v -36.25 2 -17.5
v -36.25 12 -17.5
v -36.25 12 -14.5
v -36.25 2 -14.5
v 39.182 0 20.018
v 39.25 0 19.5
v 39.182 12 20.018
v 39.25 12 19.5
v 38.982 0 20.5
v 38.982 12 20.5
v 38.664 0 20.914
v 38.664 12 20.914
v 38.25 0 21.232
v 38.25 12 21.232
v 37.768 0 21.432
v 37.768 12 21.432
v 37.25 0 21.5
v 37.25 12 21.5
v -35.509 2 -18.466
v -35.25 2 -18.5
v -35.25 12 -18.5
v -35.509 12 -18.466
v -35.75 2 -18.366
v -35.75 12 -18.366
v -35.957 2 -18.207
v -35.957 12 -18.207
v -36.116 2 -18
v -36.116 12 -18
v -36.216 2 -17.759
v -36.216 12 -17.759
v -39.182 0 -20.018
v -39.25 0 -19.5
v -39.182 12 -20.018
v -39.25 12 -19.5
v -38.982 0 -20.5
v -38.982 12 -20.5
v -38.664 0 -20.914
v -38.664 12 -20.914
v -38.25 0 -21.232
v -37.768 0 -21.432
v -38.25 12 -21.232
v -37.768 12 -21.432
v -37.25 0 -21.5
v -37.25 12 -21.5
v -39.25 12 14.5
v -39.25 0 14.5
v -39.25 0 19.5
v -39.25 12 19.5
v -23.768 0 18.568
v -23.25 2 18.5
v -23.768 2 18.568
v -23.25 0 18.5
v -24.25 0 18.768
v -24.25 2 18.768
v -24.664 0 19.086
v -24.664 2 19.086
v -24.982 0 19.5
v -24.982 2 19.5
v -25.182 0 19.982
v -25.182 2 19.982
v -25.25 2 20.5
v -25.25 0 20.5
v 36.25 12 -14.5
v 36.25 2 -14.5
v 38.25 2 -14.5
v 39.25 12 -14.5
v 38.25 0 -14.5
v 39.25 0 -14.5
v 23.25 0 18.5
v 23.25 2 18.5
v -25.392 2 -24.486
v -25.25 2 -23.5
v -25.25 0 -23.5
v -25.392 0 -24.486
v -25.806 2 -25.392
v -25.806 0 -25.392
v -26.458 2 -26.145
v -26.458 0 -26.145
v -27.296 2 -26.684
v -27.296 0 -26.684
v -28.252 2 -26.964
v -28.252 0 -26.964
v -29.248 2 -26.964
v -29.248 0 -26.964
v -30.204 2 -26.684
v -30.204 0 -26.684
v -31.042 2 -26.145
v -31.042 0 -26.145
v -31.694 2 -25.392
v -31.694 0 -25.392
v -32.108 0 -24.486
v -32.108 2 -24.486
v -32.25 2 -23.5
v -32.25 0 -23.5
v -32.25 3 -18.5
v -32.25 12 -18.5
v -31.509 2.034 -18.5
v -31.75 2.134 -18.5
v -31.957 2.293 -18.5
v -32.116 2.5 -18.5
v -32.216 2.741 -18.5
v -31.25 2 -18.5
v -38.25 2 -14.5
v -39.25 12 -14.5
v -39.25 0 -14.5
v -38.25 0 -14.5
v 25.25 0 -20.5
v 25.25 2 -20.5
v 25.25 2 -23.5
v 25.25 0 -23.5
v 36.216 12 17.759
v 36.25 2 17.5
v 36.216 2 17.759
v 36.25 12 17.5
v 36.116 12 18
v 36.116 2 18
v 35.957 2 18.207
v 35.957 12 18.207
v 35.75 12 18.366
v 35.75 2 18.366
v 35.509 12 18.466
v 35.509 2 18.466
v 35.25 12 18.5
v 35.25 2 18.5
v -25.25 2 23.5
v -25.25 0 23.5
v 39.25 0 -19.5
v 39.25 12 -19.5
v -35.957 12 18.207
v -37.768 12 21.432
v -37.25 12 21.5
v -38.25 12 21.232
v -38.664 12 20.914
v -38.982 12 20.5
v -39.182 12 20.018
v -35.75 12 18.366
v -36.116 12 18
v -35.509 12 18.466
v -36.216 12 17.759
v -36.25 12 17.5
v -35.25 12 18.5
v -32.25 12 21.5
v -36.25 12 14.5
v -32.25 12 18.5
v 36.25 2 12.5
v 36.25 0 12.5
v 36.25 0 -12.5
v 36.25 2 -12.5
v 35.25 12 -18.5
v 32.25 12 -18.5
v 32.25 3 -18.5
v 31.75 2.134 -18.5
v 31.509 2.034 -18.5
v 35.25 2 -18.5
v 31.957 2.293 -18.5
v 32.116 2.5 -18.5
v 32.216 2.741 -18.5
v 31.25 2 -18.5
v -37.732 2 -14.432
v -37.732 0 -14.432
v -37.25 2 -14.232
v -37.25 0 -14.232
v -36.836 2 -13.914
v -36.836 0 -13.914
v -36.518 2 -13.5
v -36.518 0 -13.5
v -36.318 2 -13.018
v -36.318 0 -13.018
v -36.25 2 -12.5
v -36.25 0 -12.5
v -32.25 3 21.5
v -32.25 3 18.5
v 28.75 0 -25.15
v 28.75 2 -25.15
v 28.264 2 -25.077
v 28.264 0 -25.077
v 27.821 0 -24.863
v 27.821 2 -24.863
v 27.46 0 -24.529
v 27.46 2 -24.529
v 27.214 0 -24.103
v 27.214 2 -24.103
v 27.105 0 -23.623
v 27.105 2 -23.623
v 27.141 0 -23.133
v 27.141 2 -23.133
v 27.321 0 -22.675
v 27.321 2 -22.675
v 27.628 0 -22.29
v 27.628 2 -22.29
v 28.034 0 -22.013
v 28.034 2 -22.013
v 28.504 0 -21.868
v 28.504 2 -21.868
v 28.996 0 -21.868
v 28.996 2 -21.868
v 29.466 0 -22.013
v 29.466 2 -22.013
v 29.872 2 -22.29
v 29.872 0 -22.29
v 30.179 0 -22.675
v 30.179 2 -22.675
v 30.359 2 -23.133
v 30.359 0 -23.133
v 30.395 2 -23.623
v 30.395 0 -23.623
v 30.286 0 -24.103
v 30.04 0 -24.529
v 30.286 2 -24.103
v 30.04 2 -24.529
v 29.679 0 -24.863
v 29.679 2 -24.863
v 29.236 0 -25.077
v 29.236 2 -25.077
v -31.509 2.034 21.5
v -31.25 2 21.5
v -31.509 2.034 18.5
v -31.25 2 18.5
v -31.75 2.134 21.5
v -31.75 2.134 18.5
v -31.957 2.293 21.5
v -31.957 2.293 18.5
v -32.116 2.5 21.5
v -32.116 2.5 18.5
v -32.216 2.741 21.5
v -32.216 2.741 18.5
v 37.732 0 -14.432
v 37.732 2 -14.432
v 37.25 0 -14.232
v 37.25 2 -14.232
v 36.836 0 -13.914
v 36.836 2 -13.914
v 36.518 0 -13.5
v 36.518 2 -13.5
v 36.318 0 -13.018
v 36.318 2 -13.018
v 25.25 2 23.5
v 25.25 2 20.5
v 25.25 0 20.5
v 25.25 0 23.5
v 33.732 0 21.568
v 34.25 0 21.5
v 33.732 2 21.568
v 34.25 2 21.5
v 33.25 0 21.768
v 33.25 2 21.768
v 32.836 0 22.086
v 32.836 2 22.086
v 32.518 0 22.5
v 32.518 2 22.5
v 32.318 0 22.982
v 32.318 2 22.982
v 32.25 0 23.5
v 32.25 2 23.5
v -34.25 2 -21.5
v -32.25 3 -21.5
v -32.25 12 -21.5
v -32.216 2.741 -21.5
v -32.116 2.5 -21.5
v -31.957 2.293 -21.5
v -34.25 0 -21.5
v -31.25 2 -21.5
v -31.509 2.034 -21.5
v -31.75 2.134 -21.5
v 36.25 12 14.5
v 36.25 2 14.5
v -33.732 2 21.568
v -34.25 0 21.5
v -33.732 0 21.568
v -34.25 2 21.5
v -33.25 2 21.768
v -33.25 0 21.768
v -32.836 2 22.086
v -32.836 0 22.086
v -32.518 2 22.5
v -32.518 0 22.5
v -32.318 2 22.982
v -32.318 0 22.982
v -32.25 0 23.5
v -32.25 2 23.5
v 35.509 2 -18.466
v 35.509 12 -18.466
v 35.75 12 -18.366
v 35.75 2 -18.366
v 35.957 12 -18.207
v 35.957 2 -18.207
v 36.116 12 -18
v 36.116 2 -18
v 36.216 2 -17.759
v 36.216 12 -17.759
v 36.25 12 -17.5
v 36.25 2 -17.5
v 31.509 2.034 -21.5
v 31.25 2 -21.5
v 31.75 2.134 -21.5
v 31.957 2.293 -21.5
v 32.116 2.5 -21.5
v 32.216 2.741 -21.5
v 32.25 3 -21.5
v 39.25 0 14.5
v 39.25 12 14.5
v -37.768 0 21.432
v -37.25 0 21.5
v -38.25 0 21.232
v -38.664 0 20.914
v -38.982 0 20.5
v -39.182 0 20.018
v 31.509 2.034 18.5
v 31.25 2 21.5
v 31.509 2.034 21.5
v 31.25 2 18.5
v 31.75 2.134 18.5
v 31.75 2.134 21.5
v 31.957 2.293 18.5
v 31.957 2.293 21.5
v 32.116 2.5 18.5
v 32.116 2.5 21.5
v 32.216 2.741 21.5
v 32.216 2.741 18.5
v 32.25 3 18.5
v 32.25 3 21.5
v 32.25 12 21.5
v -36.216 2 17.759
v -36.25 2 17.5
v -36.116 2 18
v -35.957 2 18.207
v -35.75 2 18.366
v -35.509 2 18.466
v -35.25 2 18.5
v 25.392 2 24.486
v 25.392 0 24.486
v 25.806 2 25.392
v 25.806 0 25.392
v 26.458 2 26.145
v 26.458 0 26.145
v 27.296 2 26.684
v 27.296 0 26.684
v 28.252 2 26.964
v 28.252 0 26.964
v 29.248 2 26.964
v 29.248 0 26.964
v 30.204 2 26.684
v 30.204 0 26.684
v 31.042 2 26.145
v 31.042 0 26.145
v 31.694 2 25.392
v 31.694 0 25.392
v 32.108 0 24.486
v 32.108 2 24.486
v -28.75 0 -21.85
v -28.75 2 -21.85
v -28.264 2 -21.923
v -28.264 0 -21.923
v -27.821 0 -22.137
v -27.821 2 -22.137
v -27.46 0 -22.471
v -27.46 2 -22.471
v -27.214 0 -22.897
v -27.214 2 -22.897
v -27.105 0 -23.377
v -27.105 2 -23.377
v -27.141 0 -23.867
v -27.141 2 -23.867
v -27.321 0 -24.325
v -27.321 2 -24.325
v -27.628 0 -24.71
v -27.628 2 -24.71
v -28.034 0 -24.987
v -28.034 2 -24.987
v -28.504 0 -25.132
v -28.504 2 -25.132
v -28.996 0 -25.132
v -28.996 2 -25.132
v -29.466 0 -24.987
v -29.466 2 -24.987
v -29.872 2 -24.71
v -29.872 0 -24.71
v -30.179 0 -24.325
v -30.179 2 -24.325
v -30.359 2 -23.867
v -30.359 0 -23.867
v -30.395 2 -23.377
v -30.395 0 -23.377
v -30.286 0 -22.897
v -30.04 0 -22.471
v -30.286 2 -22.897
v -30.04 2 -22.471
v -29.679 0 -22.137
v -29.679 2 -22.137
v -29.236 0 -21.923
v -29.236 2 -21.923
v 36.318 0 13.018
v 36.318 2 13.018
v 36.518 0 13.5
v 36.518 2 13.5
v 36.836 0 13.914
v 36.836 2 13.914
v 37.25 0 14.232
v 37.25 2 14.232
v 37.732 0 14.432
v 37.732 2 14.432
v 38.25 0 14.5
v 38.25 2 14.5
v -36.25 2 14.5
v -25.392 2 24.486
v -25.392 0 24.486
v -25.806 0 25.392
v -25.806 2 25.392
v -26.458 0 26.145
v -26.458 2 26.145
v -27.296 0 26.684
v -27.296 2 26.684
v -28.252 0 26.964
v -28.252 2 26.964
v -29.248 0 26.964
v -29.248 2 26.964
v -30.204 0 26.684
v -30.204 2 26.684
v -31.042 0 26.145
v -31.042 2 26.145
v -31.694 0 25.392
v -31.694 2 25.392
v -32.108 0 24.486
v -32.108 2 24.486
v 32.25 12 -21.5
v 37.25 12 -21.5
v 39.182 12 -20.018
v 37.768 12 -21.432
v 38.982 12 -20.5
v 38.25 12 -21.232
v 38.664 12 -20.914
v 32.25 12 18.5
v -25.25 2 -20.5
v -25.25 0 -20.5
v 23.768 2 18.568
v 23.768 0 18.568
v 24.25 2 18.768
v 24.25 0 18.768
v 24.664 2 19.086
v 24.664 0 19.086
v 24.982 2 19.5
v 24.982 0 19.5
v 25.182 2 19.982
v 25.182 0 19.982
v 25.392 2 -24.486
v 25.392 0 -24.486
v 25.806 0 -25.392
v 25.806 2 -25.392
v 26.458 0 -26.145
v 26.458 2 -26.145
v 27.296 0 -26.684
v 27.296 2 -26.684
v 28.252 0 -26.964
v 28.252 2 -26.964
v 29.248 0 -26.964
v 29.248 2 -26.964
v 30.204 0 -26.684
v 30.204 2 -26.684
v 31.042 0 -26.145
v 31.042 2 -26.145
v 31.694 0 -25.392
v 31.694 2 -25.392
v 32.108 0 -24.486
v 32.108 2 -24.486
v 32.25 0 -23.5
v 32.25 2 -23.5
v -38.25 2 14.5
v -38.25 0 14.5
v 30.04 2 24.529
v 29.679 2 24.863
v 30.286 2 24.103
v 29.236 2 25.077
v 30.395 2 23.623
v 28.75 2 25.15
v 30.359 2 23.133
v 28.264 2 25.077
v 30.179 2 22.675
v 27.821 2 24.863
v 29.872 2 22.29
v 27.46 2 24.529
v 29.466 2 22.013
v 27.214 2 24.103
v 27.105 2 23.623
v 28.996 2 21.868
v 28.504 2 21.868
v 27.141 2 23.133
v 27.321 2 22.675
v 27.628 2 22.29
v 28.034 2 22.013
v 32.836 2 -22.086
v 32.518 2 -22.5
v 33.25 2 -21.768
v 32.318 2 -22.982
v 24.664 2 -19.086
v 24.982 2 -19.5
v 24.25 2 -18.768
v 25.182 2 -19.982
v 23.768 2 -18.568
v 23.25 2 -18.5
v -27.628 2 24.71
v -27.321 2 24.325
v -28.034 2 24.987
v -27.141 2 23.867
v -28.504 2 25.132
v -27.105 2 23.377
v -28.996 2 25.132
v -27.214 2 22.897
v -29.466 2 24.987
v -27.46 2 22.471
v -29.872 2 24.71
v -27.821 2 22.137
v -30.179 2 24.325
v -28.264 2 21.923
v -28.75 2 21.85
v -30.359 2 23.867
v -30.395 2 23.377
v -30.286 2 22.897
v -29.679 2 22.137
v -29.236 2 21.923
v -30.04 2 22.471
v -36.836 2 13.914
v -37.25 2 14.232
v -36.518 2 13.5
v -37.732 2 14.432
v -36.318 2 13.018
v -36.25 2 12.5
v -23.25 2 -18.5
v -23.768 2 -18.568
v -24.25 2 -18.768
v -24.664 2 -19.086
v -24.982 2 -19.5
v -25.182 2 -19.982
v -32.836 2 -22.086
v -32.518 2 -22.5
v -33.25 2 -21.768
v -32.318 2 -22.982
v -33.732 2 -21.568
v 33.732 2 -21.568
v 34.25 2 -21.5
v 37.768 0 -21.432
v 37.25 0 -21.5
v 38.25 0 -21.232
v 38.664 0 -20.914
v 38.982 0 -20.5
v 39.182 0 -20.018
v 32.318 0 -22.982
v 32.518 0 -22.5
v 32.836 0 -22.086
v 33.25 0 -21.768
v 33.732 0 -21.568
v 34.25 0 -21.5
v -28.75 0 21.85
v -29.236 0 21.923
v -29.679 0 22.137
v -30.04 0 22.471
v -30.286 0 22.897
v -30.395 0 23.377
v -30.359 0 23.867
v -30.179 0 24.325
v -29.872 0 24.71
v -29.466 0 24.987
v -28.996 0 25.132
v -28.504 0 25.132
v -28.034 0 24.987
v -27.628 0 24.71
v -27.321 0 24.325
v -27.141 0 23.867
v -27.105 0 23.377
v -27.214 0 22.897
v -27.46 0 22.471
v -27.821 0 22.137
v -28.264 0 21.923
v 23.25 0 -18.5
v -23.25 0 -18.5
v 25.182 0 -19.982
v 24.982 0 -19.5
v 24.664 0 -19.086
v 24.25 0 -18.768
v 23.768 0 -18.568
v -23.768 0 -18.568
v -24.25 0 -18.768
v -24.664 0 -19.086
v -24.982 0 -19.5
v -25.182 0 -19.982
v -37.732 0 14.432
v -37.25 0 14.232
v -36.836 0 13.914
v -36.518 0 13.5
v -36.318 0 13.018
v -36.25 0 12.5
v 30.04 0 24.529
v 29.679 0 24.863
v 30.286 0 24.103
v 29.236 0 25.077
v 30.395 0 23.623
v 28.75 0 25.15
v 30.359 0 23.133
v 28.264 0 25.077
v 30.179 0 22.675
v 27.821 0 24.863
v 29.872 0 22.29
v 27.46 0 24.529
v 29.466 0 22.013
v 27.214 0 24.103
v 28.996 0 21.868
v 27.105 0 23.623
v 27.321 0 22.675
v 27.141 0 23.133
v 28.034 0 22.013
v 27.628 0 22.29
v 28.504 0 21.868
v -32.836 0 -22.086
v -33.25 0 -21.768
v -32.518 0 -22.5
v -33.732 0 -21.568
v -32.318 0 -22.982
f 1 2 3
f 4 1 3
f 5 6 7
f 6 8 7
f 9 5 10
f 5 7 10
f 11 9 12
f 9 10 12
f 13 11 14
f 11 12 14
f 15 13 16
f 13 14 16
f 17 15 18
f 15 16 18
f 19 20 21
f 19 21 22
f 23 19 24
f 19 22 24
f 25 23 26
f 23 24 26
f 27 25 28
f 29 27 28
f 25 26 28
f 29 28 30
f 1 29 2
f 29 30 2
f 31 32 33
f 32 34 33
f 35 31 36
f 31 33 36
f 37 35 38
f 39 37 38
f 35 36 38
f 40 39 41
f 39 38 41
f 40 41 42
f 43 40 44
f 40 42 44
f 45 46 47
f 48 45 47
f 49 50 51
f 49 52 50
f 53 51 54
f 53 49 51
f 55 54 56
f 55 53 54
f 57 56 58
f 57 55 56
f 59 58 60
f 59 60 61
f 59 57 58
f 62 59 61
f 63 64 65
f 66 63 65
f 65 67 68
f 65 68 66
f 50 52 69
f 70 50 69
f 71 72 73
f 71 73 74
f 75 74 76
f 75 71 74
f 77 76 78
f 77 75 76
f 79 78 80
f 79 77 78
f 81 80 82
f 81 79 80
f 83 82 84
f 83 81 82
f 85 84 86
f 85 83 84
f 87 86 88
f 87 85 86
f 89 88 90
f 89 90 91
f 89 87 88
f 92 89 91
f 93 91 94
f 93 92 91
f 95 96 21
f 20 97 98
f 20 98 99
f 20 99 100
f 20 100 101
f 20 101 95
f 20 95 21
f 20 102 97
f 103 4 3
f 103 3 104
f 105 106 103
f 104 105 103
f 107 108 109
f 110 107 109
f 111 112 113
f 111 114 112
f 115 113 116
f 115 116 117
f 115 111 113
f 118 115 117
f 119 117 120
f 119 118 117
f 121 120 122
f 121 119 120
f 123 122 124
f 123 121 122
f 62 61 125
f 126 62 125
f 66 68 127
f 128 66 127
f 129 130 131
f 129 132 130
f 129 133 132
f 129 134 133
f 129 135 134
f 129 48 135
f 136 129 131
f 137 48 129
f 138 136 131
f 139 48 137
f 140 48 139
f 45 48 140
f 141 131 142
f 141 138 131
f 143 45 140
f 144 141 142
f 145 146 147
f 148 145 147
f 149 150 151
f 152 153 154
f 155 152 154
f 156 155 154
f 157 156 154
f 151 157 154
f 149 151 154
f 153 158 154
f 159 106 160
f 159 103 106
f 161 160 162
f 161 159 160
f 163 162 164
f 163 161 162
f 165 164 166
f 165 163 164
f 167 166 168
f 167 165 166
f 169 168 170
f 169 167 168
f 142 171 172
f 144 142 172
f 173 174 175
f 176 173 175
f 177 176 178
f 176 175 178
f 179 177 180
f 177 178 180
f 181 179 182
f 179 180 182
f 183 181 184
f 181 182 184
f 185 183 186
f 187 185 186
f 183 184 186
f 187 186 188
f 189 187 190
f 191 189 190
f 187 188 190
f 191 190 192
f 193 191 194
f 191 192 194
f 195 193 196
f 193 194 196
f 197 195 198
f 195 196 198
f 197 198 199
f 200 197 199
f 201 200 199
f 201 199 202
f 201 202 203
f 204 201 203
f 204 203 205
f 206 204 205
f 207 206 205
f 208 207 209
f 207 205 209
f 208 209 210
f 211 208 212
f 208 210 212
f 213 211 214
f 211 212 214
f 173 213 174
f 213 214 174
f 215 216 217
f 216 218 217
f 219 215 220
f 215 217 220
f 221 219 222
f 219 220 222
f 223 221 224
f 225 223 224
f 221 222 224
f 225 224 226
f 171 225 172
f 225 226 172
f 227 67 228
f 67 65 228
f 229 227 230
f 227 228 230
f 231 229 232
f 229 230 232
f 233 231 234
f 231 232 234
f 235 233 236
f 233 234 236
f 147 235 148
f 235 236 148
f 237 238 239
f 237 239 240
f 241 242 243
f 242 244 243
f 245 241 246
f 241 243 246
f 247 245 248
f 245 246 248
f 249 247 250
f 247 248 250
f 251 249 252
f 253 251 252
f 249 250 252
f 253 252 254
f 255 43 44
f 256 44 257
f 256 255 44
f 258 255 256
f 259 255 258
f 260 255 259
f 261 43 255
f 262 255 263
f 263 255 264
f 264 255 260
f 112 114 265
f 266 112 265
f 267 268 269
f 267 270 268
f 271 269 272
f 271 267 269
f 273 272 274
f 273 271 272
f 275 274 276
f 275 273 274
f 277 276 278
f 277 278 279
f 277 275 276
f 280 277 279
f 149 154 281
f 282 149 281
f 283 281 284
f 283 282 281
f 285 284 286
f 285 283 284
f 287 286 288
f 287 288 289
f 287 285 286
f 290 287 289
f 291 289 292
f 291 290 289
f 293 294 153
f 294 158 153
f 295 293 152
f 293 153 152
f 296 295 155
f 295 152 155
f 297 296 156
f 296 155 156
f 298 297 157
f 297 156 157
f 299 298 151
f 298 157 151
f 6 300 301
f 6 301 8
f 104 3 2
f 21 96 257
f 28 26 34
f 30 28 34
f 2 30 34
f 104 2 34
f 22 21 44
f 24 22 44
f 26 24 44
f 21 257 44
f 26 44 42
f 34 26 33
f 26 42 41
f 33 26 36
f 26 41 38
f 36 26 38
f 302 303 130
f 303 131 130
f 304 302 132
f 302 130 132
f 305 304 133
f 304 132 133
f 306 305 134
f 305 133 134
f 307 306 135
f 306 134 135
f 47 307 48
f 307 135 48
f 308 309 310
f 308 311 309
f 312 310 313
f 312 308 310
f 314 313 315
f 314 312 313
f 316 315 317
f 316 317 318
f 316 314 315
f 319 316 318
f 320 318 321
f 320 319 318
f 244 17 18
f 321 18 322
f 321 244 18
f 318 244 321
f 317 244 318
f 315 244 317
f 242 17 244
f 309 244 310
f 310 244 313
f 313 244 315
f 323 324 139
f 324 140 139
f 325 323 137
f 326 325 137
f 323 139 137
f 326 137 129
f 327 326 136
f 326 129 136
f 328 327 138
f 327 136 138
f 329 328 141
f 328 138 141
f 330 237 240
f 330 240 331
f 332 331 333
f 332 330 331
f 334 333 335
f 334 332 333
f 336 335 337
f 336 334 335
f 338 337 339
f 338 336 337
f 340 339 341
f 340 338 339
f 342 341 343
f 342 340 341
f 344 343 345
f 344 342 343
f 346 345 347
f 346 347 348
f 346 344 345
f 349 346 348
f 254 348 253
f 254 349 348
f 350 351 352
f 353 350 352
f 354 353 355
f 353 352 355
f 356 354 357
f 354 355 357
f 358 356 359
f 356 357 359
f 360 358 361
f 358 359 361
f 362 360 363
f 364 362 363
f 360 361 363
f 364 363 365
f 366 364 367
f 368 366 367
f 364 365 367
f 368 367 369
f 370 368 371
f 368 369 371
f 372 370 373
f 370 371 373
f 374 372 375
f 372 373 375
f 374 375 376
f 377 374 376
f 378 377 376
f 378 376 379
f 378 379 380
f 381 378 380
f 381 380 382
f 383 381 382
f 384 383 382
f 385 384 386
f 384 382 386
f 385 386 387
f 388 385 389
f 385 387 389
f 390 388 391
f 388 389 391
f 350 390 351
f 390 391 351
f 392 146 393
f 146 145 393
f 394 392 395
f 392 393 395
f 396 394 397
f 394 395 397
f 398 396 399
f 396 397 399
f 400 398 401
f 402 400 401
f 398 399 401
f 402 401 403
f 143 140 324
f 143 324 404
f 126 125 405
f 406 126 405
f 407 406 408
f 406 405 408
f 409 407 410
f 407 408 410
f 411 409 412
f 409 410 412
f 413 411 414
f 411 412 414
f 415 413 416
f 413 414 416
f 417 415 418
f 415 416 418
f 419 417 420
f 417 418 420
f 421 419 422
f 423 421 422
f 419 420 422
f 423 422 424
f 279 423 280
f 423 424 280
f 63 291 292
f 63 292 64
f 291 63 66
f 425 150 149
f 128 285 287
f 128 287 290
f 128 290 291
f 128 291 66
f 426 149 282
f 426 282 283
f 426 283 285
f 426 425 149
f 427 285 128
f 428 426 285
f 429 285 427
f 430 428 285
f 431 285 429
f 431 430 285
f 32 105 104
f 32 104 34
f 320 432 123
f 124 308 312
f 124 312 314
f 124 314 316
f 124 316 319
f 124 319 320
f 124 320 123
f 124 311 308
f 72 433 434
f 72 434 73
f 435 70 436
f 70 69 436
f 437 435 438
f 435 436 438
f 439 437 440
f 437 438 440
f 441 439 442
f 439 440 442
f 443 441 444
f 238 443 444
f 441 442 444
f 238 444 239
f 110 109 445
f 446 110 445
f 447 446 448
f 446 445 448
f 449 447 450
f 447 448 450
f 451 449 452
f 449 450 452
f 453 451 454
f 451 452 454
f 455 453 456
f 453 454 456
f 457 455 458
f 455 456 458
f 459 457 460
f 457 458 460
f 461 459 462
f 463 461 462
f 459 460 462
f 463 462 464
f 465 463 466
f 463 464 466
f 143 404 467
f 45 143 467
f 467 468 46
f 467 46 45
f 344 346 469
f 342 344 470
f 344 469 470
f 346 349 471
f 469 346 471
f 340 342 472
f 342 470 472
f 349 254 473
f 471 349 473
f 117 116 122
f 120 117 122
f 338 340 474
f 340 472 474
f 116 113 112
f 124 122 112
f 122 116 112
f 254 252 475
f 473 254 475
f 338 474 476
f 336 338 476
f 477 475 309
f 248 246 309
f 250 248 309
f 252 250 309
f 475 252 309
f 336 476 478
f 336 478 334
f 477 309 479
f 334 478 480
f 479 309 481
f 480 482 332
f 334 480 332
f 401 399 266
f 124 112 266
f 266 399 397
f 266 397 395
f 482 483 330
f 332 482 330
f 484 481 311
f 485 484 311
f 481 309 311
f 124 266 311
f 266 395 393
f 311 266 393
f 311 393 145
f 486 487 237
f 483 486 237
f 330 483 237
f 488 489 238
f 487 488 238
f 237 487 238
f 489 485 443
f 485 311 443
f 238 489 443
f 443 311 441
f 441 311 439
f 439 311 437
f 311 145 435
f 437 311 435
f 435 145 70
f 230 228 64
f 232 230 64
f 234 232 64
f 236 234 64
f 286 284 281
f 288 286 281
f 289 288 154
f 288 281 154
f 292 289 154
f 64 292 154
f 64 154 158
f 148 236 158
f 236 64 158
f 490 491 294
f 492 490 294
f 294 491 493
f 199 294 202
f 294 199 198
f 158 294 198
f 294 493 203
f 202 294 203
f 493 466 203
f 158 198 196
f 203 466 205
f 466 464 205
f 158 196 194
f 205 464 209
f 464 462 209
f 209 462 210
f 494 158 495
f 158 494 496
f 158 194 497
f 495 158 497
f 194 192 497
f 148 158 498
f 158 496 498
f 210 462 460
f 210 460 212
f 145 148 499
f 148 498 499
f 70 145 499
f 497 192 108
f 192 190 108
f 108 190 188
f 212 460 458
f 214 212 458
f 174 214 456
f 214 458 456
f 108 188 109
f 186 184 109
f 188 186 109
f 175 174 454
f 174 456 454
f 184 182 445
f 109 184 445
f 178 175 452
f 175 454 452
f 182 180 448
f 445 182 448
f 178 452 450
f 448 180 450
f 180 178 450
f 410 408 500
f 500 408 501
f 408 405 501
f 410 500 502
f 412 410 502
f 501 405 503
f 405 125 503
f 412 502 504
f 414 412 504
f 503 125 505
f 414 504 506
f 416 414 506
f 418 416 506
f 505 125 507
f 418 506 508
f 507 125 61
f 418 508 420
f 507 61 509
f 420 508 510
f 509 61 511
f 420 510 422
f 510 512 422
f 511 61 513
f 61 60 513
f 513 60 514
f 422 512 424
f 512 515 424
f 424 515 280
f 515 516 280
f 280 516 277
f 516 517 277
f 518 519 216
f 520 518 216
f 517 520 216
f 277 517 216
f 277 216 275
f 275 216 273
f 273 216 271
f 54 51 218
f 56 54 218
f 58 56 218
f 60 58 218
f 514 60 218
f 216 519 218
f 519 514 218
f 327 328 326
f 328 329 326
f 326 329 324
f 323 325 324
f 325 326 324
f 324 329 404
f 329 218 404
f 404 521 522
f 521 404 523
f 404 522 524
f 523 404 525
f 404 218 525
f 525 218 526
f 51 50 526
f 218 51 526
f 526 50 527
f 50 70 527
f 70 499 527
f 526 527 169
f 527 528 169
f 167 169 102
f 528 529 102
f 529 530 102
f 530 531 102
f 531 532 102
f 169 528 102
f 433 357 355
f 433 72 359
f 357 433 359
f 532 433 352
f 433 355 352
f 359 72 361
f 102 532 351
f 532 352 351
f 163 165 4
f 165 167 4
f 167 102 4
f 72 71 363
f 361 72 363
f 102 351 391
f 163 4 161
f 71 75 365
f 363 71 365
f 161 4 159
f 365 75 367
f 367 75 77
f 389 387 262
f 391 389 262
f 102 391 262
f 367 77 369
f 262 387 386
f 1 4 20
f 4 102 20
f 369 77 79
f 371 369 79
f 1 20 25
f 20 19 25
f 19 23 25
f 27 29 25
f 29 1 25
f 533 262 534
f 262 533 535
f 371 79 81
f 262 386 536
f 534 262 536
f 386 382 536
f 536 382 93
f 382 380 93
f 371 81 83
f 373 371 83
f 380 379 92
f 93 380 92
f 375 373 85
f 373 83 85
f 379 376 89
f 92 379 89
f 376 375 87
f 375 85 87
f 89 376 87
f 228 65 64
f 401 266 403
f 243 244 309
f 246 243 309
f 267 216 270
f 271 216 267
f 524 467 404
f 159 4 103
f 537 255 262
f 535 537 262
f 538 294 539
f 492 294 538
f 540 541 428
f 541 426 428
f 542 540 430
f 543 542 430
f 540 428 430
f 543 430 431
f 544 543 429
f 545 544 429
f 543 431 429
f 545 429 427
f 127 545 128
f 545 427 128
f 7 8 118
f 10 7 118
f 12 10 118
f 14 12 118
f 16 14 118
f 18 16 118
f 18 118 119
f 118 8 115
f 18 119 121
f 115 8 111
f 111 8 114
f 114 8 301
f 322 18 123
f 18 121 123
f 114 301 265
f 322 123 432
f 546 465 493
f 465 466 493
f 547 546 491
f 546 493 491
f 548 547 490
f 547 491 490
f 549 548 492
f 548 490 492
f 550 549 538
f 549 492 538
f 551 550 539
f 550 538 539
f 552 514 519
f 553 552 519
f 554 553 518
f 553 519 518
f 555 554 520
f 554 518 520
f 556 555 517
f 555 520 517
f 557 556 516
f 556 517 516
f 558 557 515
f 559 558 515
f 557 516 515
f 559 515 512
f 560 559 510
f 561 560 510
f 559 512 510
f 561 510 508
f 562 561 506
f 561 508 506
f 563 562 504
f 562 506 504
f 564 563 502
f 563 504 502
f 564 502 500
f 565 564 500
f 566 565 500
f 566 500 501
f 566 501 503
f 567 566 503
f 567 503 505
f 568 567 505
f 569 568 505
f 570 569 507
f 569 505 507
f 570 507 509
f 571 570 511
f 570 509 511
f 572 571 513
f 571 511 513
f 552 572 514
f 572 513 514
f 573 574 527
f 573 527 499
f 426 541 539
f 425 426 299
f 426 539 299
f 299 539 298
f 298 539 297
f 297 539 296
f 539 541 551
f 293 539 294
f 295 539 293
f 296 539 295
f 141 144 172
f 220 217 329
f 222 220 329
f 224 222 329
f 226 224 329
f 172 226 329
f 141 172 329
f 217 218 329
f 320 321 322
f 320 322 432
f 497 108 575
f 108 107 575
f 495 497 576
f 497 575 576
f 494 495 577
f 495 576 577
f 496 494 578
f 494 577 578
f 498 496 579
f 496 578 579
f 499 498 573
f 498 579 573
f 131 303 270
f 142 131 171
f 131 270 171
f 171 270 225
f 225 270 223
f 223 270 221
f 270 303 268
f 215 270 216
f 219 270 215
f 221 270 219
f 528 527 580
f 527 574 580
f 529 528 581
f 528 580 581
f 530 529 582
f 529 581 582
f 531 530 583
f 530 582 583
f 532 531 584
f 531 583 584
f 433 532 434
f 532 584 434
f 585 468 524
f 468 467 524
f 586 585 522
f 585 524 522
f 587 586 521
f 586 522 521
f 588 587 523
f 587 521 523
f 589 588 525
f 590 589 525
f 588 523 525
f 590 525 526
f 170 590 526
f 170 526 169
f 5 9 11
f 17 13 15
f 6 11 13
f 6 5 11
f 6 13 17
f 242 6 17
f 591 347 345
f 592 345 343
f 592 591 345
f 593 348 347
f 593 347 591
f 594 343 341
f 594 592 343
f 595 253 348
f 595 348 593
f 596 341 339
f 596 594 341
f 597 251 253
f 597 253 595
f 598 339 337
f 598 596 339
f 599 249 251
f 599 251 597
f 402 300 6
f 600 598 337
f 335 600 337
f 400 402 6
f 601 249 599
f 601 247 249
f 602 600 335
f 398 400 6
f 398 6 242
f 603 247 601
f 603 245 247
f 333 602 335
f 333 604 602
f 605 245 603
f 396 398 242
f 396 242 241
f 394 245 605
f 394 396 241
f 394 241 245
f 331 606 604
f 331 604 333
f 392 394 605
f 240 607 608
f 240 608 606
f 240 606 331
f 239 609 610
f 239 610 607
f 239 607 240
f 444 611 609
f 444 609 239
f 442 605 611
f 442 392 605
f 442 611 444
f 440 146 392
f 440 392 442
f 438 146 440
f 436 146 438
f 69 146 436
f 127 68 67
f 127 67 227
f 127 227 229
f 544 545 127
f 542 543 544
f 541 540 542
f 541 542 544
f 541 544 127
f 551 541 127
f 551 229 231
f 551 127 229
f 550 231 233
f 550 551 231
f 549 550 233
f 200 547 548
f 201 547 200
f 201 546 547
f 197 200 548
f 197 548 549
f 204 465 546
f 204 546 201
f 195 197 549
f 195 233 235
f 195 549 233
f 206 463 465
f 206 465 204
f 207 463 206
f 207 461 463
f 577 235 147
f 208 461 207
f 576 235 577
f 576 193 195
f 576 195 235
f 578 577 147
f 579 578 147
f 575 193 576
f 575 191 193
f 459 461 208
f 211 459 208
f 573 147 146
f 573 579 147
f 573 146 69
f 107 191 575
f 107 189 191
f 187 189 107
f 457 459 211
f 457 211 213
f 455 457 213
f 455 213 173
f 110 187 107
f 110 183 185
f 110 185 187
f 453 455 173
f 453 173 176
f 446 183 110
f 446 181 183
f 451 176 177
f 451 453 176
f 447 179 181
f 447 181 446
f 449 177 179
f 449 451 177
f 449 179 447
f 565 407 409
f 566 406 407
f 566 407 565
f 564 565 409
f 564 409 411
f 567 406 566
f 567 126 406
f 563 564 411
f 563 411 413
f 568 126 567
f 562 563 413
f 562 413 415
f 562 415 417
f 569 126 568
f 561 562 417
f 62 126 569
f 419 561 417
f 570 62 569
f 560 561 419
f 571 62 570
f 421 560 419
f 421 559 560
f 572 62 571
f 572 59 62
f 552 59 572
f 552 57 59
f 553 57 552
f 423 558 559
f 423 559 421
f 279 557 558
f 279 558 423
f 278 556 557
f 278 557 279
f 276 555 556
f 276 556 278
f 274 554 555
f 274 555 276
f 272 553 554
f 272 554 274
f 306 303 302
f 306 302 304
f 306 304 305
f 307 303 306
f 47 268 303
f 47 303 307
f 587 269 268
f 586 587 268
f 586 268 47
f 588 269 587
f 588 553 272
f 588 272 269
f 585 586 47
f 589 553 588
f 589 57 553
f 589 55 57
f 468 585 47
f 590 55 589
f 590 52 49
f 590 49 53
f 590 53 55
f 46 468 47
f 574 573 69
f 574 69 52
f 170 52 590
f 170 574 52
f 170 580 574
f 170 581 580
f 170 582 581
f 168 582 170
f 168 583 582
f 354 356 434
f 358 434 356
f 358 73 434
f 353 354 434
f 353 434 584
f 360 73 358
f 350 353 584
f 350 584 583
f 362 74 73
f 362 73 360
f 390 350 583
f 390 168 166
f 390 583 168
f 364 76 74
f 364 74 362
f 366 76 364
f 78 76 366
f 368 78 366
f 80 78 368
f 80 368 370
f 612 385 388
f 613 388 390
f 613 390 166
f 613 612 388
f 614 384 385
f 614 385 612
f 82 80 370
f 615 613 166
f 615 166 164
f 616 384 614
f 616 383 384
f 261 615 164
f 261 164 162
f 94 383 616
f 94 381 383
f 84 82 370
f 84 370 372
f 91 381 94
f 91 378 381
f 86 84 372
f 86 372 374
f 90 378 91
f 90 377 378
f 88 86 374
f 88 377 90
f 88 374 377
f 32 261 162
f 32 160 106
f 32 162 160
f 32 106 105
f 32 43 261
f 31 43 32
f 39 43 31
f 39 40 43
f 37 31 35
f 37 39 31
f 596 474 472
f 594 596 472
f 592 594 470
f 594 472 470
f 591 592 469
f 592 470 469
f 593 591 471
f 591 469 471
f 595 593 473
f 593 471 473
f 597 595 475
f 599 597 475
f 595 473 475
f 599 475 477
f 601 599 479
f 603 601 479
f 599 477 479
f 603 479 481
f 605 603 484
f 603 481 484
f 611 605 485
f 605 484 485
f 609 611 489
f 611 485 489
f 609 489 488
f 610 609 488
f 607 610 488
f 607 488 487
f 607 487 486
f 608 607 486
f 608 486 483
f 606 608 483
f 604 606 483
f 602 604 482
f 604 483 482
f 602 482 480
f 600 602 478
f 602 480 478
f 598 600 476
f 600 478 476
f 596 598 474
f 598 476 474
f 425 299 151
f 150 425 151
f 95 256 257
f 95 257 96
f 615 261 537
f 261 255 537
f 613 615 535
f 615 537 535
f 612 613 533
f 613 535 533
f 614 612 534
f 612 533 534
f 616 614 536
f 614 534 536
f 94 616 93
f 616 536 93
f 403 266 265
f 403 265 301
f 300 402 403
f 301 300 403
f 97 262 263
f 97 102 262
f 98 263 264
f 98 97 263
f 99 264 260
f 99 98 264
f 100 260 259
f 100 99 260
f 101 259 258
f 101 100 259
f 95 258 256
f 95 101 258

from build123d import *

# Parameters (mm, degrees)
SKETCH_1_W           = 72.5
SKETCH_1_H           = 37
EXTRUDE_1_DEPTH      = 2
EXTRUDE_2_DEPTH      = 10
EXTRUDE_2_DEPTH_BACK = 2
SKETCH_3_R           = 1.65
EXTRUDE_3_DEPTH      = 2
FILLET_1_R           = 2
FILLET_2_R           = 1


with BuildPart() as part:
    # 草图1 → 凸台-拉伸1 (new body)
    with BuildSketch(Plane(origin=(0, 0, 0), x_dir=(1, 0, 0), z_dir=(0, 1, 0))):
        Rectangle(SKETCH_1_W, SKETCH_1_H)
    extrude(amount=EXTRUDE_1_DEPTH)

    # 草图2 → 凸台-拉伸2 (add, two sides: drawn at the far end of the back side and taken through both)
    with BuildSketch(Plane(origin=(0, 2, 0), x_dir=(1, 0, 0), z_dir=(0, 1, 0)).offset(-EXTRUDE_2_DEPTH_BACK)):
        Polygon((-36.25, 18.5), (-36.25, 14.5), (-39.25, 14.5), (-39.25, 21.5), (-32.25, 21.5), (-32.25, 18.5), align=None)
        Polygon((32.25, 18.5), (36.25, 18.5), (36.25, 14.5), (39.25, 14.5), (39.25, 21.5), (32.25, 21.5), align=None)
        Polygon((36.25, -18.5), (36.25, -14.5), (39.25, -14.5), (39.25, -21.5), (32.25, -21.5), (32.25, -18.5), align=None)
        Polygon((-32.25, -18.5), (-36.25, -18.5), (-36.25, -14.5), (-39.25, -14.5), (-39.25, -21.5), (-32.25, -21.5), align=None)
    extrude(amount=EXTRUDE_2_DEPTH + EXTRUDE_2_DEPTH_BACK)

    # 草图3 → 凸台-拉伸3 (add)
    # profile 1 of 4: a face of its own
    with BuildSketch(Plane(origin=(0, 2, 0), x_dir=(1, 0, 0), z_dir=(0, 1, 0))):
        with BuildLine():
            Line((25.25, 18.5), (25.25, 23.5))
            ThreePointArc((25.25, 23.5), (28.75, 27), (32.25, 23.5))
            Line((32.25, 23.5), (32.25, 18.5))
            Line((32.25, 18.5), (25.25, 18.5))
        make_face()
        with Locations(Location((28.75, 23.5, 0), (0, 0, 90))):
            Circle(SKETCH_3_R, mode=Mode.SUBTRACT)
    # profile 2 of 4: a face of its own
    with BuildSketch(Plane(origin=(0, 2, 0), x_dir=(1, 0, 0), z_dir=(0, 1, 0))):
        with BuildLine():
            Line((-32.25, 18.5), (-25.25, 18.5))
            Line((-25.25, 18.5), (-25.25, 23.5))
            ThreePointArc((-25.25, 23.5), (-28.75, 27), (-32.25, 23.5))
            Line((-32.25, 23.5), (-32.25, 18.5))
        make_face()
        with Locations(Location((-28.75, 23.5, 0), (0, 0, 270))):
            Circle(SKETCH_3_R, mode=Mode.SUBTRACT)
    # profile 3 of 4: a face of its own
    with BuildSketch(Plane(origin=(0, 2, 0), x_dir=(1, 0, 0), z_dir=(0, 1, 0))):
        with BuildLine():
            Line((32.25, -18.5), (25.25, -18.5))
            Line((25.25, -18.5), (25.25, -23.5))
            ThreePointArc((25.25, -23.5), (28.75, -27), (32.25, -23.5))
            Line((32.25, -23.5), (32.25, -18.5))
        make_face()
        with Locations(Location((28.75, -23.5, 0), (0, 0, 270))):
            Circle(SKETCH_3_R, mode=Mode.SUBTRACT)
    # profile 4 of 4: a face of its own
    with BuildSketch(Plane(origin=(0, 2, 0), x_dir=(1, 0, 0), z_dir=(0, 1, 0))):
        with BuildLine():
            Line((-25.25, -18.5), (-25.25, -23.5))
            ThreePointArc((-25.25, -23.5), (-28.75, -27), (-32.25, -23.5))
            Line((-32.25, -23.5), (-32.25, -18.5))
            Line((-32.25, -18.5), (-25.25, -18.5))
        make_face()
        with Locations(Location((-28.75, -23.5, 0), (0, 0, 90))):
            Circle(SKETCH_3_R, mode=Mode.SUBTRACT)
    extrude(amount=-EXTRUDE_3_DEPTH)

    # 圆角1
    fillet_1_edges = [part.edges().sort_by_distance(p)[0] for p in [
        (-25.25, 1, 18.5),
        (-36.25, 1, 14.5),
        (-36.25, 1, -14.5),
        (-25.25, 1, -18.5),
        (25.25, 1, -18.5),
        (36.25, 1, -14.5),
        (36.25, 1, 14.5),
        (-39.25, 6, 21.5),
        (39.25, 6, 21.5),
        (39.25, 6, -21.5),
        (-39.25, 6, -21.5),
        (-32.25, 1, -21.5),
        (32.25, 1, -21.5),
        (25.25, 1, 18.5),
        (32.25, 1, 21.5),
        (-32.25, 1, 21.5),
    ]]
    fillet(fillet_1_edges, radius=FILLET_1_R - 0.0001)  # a hair under: the kernel refuses the full size

    # 圆角2
    fillet_2_edges = [part.edges().sort_by_distance(p)[0] for p in [
        (-32.25, 2, 20),
        (32.25, 2, -20),
        (-36.25, 7, 18.5),
        (36.25, 7, 18.5),
        (36.25, 7, -18.5),
        (-36.25, 7, -18.5),
        (32.25, 2, 20),
        (-32.25, 2, -20),
    ]]
    fillet(fillet_2_edges, radius=FILLET_2_R)


solid = part.part
